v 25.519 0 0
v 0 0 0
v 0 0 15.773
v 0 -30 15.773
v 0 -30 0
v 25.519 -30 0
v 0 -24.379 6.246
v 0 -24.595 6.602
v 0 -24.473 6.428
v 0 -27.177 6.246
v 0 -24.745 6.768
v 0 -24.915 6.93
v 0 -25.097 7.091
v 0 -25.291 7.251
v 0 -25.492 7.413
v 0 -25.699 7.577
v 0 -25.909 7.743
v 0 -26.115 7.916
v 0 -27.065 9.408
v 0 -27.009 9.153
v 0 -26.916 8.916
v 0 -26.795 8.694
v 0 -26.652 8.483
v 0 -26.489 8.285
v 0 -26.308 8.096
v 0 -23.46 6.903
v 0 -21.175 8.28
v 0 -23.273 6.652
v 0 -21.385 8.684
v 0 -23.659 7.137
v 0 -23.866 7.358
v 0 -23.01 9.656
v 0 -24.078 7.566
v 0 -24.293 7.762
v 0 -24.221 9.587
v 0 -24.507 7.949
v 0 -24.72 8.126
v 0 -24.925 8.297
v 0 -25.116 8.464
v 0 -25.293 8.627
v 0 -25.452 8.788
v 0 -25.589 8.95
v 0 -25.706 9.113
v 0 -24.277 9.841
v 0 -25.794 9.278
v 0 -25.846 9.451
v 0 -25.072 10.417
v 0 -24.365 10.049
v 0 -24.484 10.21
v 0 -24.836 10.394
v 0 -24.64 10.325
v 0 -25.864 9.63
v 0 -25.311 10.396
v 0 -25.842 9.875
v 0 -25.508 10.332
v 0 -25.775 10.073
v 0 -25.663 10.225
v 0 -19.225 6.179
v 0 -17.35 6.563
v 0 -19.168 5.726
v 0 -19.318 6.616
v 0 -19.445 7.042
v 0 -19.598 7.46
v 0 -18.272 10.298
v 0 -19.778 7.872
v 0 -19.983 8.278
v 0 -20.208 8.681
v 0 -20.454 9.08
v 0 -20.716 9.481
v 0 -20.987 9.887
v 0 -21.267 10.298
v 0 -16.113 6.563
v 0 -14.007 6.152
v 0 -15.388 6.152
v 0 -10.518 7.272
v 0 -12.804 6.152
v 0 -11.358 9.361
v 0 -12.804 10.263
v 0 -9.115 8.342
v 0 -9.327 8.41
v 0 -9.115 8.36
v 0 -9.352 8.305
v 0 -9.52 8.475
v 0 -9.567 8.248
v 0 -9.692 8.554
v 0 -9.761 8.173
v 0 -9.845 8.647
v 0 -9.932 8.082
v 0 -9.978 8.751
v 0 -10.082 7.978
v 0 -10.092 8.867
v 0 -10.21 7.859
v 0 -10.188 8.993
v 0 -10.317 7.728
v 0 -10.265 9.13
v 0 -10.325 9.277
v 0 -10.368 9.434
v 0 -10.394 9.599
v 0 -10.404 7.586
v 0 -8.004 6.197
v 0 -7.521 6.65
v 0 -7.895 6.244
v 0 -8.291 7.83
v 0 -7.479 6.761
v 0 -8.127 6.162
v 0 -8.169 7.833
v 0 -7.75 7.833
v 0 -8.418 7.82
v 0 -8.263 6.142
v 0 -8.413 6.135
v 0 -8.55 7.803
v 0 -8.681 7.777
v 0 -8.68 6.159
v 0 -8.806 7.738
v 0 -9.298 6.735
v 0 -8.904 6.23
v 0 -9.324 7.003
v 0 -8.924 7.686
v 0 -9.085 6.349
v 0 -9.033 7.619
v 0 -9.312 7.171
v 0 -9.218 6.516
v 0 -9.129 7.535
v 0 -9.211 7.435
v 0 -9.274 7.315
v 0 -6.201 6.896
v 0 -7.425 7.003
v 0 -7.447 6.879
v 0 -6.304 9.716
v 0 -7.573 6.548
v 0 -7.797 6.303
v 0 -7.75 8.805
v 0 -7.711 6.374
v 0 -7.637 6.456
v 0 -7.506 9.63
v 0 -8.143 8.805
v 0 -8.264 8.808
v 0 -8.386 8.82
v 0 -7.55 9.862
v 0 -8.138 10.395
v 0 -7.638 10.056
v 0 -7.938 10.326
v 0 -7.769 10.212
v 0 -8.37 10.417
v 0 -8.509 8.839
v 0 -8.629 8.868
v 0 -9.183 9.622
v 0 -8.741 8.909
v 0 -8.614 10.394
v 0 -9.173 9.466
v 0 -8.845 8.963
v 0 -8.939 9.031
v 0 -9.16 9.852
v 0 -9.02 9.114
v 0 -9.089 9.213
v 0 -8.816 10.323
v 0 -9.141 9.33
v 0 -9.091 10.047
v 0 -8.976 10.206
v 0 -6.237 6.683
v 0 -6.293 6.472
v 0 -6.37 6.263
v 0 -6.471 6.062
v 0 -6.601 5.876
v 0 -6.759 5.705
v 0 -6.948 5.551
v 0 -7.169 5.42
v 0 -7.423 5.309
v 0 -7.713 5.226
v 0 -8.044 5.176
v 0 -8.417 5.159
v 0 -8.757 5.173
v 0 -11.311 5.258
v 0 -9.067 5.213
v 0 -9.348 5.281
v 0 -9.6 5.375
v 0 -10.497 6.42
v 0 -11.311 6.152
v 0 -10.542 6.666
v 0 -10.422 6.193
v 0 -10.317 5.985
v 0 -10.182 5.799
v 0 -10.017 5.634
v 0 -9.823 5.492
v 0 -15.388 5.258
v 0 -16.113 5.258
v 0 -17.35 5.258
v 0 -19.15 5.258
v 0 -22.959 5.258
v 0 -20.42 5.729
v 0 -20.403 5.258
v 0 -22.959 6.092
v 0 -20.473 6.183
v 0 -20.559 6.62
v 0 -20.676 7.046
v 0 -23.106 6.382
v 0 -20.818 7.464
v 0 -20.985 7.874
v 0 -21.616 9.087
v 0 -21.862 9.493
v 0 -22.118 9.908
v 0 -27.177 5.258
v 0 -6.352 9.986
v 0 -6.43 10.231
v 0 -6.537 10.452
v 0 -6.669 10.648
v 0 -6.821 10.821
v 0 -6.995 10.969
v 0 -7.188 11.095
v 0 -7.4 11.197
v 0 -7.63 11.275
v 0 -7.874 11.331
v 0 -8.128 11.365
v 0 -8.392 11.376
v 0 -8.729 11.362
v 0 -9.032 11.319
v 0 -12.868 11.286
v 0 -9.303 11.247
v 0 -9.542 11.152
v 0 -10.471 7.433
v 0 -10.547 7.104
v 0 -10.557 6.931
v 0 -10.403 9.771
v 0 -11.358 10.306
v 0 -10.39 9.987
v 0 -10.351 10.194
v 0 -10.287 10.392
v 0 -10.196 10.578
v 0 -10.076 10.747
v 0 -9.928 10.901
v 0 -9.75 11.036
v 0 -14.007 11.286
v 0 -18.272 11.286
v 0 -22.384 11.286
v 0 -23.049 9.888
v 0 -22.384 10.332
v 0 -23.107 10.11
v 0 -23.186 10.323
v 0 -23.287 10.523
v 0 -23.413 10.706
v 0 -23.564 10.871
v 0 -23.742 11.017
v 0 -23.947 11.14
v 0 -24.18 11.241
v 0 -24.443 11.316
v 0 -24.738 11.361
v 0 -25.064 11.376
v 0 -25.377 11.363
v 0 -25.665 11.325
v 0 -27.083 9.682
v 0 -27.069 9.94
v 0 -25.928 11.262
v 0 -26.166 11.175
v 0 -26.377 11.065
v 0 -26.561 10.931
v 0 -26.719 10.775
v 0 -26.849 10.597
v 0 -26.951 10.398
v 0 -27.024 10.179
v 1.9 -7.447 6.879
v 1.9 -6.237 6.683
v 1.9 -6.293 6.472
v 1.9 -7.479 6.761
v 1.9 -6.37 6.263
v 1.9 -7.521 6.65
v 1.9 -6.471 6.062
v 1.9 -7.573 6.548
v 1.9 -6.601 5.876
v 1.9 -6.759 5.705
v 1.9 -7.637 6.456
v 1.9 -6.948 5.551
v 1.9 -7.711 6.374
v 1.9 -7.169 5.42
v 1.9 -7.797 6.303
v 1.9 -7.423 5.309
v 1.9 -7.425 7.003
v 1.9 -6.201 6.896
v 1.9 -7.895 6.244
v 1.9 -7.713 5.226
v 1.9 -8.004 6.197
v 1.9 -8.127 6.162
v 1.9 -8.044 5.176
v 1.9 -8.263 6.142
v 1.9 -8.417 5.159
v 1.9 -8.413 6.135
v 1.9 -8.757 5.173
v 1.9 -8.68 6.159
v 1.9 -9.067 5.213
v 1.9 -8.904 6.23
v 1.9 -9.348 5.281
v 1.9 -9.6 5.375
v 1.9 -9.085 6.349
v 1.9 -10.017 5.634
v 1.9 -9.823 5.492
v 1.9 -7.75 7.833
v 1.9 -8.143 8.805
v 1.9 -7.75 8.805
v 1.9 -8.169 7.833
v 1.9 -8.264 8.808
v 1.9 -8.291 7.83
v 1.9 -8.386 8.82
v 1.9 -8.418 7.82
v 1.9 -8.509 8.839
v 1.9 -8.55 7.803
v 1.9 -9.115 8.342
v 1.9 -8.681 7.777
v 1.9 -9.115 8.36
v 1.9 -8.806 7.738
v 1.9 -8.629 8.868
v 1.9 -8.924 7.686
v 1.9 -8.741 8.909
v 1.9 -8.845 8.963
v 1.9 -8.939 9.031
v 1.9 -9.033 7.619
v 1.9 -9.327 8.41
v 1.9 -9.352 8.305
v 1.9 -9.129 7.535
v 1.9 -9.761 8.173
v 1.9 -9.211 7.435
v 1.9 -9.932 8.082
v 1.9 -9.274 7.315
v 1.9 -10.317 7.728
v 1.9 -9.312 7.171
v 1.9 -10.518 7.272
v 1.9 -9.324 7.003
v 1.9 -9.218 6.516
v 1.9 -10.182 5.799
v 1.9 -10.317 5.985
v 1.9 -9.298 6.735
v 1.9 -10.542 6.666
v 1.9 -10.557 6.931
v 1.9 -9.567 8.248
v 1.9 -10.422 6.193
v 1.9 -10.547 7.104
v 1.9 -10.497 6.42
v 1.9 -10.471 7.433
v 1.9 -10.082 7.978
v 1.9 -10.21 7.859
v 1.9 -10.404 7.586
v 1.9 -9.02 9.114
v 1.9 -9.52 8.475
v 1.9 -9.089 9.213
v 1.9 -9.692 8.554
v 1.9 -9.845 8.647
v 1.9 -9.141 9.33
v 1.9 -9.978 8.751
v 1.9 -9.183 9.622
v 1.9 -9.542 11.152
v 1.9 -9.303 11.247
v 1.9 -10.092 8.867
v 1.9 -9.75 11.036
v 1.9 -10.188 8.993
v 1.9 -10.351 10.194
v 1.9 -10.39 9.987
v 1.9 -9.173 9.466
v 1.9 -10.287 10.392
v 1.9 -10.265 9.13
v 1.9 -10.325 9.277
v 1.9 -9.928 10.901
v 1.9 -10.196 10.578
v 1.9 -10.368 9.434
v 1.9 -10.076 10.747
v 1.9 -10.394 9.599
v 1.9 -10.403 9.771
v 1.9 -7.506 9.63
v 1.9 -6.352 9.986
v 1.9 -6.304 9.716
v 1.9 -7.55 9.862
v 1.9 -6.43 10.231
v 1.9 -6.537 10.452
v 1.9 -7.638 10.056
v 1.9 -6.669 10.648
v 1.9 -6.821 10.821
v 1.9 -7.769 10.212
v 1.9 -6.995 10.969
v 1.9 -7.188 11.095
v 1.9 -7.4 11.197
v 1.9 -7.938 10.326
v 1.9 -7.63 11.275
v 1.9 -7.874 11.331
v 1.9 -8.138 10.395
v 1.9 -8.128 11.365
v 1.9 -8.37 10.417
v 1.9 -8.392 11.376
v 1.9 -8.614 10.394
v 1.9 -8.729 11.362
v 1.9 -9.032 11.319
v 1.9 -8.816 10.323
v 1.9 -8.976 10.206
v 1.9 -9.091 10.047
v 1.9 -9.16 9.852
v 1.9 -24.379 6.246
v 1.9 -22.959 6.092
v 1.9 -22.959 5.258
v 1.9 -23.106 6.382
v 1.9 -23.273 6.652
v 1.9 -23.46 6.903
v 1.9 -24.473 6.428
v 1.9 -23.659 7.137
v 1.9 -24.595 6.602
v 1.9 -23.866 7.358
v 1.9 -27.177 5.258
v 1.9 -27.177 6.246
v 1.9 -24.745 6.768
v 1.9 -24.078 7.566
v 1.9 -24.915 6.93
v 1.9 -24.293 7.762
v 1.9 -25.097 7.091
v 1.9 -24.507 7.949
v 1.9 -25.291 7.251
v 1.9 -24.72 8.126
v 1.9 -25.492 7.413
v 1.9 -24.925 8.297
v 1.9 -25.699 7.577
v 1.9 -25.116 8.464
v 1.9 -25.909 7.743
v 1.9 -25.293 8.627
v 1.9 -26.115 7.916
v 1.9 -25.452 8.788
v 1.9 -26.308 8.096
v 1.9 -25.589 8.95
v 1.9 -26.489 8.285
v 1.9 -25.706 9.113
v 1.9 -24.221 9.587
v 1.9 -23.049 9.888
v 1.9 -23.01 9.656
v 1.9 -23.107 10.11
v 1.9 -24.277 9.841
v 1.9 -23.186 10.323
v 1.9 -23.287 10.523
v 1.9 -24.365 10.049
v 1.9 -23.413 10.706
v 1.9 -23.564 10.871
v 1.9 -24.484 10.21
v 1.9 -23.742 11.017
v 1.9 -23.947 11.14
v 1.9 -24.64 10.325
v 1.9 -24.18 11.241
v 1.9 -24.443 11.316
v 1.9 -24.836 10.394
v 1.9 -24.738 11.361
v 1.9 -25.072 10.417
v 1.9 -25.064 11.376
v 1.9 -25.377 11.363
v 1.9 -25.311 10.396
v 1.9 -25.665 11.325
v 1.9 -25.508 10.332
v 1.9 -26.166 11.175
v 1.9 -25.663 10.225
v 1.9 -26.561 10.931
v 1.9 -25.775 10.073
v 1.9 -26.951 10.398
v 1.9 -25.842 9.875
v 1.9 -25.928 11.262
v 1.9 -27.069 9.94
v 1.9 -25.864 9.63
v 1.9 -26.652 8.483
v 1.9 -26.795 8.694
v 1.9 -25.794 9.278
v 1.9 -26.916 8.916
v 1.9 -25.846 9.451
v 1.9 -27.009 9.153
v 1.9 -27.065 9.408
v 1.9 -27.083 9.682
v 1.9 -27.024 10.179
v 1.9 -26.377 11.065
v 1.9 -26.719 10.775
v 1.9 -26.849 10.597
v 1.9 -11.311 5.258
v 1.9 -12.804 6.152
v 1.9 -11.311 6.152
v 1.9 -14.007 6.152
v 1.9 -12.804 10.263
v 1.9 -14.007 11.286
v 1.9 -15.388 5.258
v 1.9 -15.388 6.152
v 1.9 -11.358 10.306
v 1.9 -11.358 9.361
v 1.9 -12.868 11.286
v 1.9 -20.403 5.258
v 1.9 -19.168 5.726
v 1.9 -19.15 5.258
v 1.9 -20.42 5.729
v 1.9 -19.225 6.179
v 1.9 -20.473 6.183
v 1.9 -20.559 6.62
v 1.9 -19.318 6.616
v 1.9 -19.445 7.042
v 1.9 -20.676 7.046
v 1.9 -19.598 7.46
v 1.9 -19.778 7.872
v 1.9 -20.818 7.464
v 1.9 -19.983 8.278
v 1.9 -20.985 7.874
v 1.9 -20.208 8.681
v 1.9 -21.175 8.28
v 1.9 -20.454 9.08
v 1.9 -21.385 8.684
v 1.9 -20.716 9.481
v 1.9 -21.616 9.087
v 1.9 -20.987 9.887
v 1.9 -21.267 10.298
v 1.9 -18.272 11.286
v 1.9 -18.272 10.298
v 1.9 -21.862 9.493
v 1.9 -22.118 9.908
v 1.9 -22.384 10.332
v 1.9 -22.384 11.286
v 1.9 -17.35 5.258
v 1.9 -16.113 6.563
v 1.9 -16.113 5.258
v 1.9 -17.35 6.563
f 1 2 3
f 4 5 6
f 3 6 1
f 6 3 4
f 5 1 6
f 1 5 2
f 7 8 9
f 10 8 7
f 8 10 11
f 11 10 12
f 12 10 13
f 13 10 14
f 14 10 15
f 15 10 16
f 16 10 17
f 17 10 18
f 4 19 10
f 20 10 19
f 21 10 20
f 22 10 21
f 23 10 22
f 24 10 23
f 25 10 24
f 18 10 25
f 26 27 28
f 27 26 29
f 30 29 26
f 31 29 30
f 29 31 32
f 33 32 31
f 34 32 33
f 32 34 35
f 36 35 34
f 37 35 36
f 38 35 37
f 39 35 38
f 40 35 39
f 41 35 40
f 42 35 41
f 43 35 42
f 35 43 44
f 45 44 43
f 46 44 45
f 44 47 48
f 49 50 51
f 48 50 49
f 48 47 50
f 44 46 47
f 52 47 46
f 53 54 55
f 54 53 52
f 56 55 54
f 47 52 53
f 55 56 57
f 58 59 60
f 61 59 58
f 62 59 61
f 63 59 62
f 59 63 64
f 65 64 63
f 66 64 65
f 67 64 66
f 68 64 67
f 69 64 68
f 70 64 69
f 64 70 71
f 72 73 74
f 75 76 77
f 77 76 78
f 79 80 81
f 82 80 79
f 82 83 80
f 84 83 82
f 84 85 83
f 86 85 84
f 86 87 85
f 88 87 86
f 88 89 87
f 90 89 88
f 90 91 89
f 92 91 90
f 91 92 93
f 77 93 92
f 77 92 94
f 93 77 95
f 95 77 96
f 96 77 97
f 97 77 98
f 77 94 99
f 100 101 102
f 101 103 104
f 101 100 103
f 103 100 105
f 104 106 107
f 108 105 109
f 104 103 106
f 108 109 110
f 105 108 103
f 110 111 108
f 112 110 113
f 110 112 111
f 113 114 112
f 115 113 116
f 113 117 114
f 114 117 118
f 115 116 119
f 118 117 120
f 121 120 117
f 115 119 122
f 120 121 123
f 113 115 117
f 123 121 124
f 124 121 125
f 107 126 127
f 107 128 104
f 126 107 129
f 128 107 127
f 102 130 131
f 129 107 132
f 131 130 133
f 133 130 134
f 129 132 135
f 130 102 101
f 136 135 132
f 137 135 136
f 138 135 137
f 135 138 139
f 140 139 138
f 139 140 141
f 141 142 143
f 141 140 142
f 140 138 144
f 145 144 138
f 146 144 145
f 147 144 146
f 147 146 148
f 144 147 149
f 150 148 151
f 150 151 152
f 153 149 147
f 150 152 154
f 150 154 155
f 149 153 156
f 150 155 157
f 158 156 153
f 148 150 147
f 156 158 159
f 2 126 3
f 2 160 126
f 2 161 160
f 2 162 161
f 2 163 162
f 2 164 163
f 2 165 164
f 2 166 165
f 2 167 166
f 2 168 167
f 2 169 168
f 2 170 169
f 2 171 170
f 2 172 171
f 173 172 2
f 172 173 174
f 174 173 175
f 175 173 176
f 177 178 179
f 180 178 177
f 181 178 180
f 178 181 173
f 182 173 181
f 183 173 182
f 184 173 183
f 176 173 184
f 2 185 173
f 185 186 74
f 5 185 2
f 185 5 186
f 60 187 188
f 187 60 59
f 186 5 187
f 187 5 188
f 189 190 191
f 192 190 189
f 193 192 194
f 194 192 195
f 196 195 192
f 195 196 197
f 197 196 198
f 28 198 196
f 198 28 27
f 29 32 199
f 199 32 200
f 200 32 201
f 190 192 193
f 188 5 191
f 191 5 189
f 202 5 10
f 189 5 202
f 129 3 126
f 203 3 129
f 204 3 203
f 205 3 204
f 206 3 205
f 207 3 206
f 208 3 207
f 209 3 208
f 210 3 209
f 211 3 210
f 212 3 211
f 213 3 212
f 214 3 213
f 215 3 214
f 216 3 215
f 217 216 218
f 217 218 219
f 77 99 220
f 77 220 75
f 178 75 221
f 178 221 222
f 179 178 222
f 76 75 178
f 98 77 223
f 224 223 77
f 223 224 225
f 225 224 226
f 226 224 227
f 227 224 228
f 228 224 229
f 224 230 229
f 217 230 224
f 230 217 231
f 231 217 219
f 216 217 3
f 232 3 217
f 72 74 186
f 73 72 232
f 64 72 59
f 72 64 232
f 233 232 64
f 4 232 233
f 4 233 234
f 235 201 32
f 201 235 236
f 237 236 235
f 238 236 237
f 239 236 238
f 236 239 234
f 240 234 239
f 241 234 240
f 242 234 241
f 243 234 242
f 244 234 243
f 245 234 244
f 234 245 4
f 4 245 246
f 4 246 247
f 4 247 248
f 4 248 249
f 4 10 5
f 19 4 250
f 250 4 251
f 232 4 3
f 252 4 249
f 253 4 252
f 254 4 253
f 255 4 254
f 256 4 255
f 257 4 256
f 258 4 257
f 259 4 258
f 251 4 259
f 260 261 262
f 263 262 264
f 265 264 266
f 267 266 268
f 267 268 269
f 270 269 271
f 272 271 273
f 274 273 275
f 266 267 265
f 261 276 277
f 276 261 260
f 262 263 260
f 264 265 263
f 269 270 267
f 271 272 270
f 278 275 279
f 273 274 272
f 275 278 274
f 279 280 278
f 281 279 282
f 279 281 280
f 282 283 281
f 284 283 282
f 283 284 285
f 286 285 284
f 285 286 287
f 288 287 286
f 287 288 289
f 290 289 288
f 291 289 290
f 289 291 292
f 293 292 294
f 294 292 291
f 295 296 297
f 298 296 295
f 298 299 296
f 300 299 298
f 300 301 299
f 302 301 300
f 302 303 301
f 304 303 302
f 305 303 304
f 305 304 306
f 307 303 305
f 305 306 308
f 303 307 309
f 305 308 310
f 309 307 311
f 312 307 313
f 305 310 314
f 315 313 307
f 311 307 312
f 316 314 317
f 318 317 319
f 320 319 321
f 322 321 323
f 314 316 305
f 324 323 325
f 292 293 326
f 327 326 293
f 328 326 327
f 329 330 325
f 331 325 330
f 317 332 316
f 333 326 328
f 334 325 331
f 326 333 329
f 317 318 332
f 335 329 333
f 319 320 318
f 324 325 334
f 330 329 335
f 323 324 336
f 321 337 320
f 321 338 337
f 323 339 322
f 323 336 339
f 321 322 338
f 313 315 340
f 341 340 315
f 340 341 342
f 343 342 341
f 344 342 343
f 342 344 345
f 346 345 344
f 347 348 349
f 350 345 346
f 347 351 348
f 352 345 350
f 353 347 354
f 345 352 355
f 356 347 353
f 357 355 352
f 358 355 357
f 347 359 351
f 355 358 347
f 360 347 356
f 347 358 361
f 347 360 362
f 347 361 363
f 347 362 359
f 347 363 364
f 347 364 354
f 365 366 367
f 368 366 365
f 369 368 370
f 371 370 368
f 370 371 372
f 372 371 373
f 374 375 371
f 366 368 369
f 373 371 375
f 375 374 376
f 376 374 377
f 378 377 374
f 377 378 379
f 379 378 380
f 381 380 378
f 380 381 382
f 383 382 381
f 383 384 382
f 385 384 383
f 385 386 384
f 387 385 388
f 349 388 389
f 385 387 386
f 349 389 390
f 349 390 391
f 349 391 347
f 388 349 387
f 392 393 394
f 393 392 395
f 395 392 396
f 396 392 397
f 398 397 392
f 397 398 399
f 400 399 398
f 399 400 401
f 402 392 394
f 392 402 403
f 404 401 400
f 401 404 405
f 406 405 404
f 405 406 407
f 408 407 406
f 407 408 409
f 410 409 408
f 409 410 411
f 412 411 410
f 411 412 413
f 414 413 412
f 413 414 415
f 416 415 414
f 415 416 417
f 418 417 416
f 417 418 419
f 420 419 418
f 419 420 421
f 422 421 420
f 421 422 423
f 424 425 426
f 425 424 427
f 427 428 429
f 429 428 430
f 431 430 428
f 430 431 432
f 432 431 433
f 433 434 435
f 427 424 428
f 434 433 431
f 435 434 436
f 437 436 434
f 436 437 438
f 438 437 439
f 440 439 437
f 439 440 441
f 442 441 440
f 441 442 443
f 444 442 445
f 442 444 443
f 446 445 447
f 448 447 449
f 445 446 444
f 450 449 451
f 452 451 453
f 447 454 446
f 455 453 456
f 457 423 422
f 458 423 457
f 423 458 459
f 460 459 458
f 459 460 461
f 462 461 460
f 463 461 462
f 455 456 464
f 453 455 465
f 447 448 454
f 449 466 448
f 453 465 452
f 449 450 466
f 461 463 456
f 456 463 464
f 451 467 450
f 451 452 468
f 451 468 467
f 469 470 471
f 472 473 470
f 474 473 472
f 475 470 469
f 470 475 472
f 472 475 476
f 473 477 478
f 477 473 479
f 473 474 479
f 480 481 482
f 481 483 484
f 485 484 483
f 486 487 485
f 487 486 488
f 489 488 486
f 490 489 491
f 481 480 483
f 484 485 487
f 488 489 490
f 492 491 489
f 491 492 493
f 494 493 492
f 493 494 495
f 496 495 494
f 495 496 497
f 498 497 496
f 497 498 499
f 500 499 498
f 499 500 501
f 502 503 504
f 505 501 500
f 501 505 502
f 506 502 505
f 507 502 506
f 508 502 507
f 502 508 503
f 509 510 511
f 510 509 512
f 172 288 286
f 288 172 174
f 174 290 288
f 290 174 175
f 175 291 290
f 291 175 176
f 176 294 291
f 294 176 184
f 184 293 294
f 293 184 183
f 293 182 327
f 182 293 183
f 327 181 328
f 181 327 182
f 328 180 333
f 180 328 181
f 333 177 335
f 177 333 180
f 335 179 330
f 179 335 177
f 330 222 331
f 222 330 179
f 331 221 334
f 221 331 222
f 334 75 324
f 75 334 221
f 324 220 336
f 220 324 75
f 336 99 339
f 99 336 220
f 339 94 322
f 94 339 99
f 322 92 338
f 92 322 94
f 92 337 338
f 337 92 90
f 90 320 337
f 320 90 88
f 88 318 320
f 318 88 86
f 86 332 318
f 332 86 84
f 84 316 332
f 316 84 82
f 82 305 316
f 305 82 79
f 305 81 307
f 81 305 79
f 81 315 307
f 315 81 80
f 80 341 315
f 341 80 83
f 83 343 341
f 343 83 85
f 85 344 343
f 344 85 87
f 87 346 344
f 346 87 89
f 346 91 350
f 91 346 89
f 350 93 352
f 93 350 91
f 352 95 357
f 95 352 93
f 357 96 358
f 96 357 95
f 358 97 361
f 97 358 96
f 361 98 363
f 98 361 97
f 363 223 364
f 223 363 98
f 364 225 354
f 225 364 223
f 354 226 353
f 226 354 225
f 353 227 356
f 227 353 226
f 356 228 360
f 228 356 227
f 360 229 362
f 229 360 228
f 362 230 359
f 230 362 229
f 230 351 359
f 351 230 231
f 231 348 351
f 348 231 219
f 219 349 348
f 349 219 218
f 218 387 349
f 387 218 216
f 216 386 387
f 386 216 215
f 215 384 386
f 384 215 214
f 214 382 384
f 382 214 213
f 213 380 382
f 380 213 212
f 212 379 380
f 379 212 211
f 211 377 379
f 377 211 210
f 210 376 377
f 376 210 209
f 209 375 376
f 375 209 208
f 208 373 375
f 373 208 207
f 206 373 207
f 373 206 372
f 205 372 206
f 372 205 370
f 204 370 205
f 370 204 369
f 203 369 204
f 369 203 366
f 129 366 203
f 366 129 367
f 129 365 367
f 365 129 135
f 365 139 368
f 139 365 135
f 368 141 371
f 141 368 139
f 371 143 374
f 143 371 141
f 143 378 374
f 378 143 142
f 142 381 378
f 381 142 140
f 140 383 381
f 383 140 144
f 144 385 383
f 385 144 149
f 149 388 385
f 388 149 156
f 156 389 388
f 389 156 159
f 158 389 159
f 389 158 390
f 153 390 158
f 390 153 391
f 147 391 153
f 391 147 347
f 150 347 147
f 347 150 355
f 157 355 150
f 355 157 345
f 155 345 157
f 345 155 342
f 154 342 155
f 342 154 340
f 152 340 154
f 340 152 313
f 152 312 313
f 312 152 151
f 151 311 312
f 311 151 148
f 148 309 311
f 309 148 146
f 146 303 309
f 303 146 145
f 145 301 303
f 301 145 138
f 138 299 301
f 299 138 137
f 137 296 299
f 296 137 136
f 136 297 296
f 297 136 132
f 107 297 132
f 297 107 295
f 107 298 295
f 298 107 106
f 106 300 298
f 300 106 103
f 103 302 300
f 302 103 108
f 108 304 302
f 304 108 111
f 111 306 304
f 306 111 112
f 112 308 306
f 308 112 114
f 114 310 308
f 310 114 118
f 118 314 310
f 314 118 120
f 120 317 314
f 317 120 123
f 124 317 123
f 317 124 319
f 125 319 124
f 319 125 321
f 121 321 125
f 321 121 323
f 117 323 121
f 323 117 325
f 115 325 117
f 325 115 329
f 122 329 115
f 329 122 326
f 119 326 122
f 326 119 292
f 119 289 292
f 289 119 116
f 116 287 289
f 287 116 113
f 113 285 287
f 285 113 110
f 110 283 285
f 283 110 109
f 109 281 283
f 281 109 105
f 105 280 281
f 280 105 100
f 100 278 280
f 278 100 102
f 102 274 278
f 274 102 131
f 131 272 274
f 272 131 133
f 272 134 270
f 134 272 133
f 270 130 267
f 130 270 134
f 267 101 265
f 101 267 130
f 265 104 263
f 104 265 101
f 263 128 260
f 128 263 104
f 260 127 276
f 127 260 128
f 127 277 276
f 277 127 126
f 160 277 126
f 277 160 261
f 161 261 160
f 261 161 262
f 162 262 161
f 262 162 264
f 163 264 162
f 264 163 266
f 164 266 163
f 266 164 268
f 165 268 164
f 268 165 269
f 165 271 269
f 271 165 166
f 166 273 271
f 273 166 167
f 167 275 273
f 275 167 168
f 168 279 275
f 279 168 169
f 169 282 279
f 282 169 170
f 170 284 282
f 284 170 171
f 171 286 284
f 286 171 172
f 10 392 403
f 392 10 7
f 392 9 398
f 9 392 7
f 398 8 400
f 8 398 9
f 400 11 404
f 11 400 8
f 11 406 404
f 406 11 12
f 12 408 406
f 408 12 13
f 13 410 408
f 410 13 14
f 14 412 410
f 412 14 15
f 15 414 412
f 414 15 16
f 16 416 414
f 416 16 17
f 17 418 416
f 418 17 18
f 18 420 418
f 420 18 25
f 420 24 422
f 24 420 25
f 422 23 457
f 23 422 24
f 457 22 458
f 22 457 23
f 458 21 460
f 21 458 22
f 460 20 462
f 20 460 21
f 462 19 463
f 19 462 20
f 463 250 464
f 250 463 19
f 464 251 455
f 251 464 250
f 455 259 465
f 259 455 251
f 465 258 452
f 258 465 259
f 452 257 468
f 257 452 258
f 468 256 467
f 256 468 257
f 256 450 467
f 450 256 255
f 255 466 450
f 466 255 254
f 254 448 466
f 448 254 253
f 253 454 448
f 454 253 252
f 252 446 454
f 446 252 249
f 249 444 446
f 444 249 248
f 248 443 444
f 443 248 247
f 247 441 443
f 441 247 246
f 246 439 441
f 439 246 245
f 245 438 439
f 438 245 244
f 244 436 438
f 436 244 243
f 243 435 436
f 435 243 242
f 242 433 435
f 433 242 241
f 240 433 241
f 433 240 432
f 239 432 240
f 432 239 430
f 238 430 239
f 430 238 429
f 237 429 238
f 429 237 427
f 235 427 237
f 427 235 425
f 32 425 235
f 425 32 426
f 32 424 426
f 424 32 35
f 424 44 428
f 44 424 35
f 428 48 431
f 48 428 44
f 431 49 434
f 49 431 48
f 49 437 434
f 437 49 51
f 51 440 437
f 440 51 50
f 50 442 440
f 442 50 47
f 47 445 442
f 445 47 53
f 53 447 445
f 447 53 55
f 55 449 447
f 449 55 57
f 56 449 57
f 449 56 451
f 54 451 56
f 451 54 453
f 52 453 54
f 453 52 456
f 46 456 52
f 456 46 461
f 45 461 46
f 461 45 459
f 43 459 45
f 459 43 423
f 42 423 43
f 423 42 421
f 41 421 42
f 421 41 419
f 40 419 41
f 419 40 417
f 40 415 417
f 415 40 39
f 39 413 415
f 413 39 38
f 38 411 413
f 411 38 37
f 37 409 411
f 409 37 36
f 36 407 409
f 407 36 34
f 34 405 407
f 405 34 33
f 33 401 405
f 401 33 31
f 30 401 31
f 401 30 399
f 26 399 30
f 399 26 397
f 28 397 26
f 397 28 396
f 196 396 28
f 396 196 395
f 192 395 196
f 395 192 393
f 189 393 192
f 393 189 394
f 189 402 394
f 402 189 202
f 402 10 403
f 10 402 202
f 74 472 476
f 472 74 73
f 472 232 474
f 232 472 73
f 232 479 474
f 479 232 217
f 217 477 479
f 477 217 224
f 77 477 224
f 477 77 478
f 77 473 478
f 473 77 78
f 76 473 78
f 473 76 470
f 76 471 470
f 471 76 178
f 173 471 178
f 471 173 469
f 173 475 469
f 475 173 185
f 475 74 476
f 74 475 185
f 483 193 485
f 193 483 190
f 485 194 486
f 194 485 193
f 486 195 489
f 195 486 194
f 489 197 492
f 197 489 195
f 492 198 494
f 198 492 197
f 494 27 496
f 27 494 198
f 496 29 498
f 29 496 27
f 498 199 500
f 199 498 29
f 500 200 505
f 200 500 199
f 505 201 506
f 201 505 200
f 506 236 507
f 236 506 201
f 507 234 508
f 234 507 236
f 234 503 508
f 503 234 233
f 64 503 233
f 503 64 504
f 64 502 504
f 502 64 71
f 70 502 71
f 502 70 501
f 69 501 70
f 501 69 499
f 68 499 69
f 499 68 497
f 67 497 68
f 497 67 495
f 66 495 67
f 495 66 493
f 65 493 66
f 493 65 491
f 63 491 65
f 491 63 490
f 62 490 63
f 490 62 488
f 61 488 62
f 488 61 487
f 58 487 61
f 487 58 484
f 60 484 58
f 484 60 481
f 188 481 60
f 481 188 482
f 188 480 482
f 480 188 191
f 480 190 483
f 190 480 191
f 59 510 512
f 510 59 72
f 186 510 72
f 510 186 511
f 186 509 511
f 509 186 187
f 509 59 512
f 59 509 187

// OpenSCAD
// wedge
// angle of wedge

// to make wedge as bevel guide, angle = 90 - bevel-angle

angle=31.72;
// length of sloping side in mm
slope =30;
// length of wedge in mm
length = 30;
//depth of engraved text
text_depth = 2;

function perimeter_to_polygon(peri,pos=[0,0],dir=0,i=0) =
    i == len(peri)
      ? [pos]
      : let(side = peri[i])
        let (distance = side[0])
        let (newpos = pos + distance* [cos(dir), sin(dir)])
        let (angle = side[1])
        let (newdir = dir + (180 - angle))
        concat([pos],perimeter_to_polygon(peri,newpos,newdir,i+1)) 
     ; 

function perimeter(angle,slope) =
   [[slope*cos(angle),angle],[slope ,90-angle], [slope*sin(angle),90]];


polygon = perimeter_to_polygon(perimeter(angle,slope));

difference() {
     rotate([90,0,0]) 
           linear_extrude(height=length)
           polygon(polygon);
     translate([text_depth-0.10,-length/5,slope*sin(angle)/3])
         rotate([90,0,0])
            rotate([0,-90,0])
                linear_extrude(height=text_depth) 
                     text(str(angle),size=slope*sin(angle)*0.4,font="Liberation Sans:style=Bold");
  }
